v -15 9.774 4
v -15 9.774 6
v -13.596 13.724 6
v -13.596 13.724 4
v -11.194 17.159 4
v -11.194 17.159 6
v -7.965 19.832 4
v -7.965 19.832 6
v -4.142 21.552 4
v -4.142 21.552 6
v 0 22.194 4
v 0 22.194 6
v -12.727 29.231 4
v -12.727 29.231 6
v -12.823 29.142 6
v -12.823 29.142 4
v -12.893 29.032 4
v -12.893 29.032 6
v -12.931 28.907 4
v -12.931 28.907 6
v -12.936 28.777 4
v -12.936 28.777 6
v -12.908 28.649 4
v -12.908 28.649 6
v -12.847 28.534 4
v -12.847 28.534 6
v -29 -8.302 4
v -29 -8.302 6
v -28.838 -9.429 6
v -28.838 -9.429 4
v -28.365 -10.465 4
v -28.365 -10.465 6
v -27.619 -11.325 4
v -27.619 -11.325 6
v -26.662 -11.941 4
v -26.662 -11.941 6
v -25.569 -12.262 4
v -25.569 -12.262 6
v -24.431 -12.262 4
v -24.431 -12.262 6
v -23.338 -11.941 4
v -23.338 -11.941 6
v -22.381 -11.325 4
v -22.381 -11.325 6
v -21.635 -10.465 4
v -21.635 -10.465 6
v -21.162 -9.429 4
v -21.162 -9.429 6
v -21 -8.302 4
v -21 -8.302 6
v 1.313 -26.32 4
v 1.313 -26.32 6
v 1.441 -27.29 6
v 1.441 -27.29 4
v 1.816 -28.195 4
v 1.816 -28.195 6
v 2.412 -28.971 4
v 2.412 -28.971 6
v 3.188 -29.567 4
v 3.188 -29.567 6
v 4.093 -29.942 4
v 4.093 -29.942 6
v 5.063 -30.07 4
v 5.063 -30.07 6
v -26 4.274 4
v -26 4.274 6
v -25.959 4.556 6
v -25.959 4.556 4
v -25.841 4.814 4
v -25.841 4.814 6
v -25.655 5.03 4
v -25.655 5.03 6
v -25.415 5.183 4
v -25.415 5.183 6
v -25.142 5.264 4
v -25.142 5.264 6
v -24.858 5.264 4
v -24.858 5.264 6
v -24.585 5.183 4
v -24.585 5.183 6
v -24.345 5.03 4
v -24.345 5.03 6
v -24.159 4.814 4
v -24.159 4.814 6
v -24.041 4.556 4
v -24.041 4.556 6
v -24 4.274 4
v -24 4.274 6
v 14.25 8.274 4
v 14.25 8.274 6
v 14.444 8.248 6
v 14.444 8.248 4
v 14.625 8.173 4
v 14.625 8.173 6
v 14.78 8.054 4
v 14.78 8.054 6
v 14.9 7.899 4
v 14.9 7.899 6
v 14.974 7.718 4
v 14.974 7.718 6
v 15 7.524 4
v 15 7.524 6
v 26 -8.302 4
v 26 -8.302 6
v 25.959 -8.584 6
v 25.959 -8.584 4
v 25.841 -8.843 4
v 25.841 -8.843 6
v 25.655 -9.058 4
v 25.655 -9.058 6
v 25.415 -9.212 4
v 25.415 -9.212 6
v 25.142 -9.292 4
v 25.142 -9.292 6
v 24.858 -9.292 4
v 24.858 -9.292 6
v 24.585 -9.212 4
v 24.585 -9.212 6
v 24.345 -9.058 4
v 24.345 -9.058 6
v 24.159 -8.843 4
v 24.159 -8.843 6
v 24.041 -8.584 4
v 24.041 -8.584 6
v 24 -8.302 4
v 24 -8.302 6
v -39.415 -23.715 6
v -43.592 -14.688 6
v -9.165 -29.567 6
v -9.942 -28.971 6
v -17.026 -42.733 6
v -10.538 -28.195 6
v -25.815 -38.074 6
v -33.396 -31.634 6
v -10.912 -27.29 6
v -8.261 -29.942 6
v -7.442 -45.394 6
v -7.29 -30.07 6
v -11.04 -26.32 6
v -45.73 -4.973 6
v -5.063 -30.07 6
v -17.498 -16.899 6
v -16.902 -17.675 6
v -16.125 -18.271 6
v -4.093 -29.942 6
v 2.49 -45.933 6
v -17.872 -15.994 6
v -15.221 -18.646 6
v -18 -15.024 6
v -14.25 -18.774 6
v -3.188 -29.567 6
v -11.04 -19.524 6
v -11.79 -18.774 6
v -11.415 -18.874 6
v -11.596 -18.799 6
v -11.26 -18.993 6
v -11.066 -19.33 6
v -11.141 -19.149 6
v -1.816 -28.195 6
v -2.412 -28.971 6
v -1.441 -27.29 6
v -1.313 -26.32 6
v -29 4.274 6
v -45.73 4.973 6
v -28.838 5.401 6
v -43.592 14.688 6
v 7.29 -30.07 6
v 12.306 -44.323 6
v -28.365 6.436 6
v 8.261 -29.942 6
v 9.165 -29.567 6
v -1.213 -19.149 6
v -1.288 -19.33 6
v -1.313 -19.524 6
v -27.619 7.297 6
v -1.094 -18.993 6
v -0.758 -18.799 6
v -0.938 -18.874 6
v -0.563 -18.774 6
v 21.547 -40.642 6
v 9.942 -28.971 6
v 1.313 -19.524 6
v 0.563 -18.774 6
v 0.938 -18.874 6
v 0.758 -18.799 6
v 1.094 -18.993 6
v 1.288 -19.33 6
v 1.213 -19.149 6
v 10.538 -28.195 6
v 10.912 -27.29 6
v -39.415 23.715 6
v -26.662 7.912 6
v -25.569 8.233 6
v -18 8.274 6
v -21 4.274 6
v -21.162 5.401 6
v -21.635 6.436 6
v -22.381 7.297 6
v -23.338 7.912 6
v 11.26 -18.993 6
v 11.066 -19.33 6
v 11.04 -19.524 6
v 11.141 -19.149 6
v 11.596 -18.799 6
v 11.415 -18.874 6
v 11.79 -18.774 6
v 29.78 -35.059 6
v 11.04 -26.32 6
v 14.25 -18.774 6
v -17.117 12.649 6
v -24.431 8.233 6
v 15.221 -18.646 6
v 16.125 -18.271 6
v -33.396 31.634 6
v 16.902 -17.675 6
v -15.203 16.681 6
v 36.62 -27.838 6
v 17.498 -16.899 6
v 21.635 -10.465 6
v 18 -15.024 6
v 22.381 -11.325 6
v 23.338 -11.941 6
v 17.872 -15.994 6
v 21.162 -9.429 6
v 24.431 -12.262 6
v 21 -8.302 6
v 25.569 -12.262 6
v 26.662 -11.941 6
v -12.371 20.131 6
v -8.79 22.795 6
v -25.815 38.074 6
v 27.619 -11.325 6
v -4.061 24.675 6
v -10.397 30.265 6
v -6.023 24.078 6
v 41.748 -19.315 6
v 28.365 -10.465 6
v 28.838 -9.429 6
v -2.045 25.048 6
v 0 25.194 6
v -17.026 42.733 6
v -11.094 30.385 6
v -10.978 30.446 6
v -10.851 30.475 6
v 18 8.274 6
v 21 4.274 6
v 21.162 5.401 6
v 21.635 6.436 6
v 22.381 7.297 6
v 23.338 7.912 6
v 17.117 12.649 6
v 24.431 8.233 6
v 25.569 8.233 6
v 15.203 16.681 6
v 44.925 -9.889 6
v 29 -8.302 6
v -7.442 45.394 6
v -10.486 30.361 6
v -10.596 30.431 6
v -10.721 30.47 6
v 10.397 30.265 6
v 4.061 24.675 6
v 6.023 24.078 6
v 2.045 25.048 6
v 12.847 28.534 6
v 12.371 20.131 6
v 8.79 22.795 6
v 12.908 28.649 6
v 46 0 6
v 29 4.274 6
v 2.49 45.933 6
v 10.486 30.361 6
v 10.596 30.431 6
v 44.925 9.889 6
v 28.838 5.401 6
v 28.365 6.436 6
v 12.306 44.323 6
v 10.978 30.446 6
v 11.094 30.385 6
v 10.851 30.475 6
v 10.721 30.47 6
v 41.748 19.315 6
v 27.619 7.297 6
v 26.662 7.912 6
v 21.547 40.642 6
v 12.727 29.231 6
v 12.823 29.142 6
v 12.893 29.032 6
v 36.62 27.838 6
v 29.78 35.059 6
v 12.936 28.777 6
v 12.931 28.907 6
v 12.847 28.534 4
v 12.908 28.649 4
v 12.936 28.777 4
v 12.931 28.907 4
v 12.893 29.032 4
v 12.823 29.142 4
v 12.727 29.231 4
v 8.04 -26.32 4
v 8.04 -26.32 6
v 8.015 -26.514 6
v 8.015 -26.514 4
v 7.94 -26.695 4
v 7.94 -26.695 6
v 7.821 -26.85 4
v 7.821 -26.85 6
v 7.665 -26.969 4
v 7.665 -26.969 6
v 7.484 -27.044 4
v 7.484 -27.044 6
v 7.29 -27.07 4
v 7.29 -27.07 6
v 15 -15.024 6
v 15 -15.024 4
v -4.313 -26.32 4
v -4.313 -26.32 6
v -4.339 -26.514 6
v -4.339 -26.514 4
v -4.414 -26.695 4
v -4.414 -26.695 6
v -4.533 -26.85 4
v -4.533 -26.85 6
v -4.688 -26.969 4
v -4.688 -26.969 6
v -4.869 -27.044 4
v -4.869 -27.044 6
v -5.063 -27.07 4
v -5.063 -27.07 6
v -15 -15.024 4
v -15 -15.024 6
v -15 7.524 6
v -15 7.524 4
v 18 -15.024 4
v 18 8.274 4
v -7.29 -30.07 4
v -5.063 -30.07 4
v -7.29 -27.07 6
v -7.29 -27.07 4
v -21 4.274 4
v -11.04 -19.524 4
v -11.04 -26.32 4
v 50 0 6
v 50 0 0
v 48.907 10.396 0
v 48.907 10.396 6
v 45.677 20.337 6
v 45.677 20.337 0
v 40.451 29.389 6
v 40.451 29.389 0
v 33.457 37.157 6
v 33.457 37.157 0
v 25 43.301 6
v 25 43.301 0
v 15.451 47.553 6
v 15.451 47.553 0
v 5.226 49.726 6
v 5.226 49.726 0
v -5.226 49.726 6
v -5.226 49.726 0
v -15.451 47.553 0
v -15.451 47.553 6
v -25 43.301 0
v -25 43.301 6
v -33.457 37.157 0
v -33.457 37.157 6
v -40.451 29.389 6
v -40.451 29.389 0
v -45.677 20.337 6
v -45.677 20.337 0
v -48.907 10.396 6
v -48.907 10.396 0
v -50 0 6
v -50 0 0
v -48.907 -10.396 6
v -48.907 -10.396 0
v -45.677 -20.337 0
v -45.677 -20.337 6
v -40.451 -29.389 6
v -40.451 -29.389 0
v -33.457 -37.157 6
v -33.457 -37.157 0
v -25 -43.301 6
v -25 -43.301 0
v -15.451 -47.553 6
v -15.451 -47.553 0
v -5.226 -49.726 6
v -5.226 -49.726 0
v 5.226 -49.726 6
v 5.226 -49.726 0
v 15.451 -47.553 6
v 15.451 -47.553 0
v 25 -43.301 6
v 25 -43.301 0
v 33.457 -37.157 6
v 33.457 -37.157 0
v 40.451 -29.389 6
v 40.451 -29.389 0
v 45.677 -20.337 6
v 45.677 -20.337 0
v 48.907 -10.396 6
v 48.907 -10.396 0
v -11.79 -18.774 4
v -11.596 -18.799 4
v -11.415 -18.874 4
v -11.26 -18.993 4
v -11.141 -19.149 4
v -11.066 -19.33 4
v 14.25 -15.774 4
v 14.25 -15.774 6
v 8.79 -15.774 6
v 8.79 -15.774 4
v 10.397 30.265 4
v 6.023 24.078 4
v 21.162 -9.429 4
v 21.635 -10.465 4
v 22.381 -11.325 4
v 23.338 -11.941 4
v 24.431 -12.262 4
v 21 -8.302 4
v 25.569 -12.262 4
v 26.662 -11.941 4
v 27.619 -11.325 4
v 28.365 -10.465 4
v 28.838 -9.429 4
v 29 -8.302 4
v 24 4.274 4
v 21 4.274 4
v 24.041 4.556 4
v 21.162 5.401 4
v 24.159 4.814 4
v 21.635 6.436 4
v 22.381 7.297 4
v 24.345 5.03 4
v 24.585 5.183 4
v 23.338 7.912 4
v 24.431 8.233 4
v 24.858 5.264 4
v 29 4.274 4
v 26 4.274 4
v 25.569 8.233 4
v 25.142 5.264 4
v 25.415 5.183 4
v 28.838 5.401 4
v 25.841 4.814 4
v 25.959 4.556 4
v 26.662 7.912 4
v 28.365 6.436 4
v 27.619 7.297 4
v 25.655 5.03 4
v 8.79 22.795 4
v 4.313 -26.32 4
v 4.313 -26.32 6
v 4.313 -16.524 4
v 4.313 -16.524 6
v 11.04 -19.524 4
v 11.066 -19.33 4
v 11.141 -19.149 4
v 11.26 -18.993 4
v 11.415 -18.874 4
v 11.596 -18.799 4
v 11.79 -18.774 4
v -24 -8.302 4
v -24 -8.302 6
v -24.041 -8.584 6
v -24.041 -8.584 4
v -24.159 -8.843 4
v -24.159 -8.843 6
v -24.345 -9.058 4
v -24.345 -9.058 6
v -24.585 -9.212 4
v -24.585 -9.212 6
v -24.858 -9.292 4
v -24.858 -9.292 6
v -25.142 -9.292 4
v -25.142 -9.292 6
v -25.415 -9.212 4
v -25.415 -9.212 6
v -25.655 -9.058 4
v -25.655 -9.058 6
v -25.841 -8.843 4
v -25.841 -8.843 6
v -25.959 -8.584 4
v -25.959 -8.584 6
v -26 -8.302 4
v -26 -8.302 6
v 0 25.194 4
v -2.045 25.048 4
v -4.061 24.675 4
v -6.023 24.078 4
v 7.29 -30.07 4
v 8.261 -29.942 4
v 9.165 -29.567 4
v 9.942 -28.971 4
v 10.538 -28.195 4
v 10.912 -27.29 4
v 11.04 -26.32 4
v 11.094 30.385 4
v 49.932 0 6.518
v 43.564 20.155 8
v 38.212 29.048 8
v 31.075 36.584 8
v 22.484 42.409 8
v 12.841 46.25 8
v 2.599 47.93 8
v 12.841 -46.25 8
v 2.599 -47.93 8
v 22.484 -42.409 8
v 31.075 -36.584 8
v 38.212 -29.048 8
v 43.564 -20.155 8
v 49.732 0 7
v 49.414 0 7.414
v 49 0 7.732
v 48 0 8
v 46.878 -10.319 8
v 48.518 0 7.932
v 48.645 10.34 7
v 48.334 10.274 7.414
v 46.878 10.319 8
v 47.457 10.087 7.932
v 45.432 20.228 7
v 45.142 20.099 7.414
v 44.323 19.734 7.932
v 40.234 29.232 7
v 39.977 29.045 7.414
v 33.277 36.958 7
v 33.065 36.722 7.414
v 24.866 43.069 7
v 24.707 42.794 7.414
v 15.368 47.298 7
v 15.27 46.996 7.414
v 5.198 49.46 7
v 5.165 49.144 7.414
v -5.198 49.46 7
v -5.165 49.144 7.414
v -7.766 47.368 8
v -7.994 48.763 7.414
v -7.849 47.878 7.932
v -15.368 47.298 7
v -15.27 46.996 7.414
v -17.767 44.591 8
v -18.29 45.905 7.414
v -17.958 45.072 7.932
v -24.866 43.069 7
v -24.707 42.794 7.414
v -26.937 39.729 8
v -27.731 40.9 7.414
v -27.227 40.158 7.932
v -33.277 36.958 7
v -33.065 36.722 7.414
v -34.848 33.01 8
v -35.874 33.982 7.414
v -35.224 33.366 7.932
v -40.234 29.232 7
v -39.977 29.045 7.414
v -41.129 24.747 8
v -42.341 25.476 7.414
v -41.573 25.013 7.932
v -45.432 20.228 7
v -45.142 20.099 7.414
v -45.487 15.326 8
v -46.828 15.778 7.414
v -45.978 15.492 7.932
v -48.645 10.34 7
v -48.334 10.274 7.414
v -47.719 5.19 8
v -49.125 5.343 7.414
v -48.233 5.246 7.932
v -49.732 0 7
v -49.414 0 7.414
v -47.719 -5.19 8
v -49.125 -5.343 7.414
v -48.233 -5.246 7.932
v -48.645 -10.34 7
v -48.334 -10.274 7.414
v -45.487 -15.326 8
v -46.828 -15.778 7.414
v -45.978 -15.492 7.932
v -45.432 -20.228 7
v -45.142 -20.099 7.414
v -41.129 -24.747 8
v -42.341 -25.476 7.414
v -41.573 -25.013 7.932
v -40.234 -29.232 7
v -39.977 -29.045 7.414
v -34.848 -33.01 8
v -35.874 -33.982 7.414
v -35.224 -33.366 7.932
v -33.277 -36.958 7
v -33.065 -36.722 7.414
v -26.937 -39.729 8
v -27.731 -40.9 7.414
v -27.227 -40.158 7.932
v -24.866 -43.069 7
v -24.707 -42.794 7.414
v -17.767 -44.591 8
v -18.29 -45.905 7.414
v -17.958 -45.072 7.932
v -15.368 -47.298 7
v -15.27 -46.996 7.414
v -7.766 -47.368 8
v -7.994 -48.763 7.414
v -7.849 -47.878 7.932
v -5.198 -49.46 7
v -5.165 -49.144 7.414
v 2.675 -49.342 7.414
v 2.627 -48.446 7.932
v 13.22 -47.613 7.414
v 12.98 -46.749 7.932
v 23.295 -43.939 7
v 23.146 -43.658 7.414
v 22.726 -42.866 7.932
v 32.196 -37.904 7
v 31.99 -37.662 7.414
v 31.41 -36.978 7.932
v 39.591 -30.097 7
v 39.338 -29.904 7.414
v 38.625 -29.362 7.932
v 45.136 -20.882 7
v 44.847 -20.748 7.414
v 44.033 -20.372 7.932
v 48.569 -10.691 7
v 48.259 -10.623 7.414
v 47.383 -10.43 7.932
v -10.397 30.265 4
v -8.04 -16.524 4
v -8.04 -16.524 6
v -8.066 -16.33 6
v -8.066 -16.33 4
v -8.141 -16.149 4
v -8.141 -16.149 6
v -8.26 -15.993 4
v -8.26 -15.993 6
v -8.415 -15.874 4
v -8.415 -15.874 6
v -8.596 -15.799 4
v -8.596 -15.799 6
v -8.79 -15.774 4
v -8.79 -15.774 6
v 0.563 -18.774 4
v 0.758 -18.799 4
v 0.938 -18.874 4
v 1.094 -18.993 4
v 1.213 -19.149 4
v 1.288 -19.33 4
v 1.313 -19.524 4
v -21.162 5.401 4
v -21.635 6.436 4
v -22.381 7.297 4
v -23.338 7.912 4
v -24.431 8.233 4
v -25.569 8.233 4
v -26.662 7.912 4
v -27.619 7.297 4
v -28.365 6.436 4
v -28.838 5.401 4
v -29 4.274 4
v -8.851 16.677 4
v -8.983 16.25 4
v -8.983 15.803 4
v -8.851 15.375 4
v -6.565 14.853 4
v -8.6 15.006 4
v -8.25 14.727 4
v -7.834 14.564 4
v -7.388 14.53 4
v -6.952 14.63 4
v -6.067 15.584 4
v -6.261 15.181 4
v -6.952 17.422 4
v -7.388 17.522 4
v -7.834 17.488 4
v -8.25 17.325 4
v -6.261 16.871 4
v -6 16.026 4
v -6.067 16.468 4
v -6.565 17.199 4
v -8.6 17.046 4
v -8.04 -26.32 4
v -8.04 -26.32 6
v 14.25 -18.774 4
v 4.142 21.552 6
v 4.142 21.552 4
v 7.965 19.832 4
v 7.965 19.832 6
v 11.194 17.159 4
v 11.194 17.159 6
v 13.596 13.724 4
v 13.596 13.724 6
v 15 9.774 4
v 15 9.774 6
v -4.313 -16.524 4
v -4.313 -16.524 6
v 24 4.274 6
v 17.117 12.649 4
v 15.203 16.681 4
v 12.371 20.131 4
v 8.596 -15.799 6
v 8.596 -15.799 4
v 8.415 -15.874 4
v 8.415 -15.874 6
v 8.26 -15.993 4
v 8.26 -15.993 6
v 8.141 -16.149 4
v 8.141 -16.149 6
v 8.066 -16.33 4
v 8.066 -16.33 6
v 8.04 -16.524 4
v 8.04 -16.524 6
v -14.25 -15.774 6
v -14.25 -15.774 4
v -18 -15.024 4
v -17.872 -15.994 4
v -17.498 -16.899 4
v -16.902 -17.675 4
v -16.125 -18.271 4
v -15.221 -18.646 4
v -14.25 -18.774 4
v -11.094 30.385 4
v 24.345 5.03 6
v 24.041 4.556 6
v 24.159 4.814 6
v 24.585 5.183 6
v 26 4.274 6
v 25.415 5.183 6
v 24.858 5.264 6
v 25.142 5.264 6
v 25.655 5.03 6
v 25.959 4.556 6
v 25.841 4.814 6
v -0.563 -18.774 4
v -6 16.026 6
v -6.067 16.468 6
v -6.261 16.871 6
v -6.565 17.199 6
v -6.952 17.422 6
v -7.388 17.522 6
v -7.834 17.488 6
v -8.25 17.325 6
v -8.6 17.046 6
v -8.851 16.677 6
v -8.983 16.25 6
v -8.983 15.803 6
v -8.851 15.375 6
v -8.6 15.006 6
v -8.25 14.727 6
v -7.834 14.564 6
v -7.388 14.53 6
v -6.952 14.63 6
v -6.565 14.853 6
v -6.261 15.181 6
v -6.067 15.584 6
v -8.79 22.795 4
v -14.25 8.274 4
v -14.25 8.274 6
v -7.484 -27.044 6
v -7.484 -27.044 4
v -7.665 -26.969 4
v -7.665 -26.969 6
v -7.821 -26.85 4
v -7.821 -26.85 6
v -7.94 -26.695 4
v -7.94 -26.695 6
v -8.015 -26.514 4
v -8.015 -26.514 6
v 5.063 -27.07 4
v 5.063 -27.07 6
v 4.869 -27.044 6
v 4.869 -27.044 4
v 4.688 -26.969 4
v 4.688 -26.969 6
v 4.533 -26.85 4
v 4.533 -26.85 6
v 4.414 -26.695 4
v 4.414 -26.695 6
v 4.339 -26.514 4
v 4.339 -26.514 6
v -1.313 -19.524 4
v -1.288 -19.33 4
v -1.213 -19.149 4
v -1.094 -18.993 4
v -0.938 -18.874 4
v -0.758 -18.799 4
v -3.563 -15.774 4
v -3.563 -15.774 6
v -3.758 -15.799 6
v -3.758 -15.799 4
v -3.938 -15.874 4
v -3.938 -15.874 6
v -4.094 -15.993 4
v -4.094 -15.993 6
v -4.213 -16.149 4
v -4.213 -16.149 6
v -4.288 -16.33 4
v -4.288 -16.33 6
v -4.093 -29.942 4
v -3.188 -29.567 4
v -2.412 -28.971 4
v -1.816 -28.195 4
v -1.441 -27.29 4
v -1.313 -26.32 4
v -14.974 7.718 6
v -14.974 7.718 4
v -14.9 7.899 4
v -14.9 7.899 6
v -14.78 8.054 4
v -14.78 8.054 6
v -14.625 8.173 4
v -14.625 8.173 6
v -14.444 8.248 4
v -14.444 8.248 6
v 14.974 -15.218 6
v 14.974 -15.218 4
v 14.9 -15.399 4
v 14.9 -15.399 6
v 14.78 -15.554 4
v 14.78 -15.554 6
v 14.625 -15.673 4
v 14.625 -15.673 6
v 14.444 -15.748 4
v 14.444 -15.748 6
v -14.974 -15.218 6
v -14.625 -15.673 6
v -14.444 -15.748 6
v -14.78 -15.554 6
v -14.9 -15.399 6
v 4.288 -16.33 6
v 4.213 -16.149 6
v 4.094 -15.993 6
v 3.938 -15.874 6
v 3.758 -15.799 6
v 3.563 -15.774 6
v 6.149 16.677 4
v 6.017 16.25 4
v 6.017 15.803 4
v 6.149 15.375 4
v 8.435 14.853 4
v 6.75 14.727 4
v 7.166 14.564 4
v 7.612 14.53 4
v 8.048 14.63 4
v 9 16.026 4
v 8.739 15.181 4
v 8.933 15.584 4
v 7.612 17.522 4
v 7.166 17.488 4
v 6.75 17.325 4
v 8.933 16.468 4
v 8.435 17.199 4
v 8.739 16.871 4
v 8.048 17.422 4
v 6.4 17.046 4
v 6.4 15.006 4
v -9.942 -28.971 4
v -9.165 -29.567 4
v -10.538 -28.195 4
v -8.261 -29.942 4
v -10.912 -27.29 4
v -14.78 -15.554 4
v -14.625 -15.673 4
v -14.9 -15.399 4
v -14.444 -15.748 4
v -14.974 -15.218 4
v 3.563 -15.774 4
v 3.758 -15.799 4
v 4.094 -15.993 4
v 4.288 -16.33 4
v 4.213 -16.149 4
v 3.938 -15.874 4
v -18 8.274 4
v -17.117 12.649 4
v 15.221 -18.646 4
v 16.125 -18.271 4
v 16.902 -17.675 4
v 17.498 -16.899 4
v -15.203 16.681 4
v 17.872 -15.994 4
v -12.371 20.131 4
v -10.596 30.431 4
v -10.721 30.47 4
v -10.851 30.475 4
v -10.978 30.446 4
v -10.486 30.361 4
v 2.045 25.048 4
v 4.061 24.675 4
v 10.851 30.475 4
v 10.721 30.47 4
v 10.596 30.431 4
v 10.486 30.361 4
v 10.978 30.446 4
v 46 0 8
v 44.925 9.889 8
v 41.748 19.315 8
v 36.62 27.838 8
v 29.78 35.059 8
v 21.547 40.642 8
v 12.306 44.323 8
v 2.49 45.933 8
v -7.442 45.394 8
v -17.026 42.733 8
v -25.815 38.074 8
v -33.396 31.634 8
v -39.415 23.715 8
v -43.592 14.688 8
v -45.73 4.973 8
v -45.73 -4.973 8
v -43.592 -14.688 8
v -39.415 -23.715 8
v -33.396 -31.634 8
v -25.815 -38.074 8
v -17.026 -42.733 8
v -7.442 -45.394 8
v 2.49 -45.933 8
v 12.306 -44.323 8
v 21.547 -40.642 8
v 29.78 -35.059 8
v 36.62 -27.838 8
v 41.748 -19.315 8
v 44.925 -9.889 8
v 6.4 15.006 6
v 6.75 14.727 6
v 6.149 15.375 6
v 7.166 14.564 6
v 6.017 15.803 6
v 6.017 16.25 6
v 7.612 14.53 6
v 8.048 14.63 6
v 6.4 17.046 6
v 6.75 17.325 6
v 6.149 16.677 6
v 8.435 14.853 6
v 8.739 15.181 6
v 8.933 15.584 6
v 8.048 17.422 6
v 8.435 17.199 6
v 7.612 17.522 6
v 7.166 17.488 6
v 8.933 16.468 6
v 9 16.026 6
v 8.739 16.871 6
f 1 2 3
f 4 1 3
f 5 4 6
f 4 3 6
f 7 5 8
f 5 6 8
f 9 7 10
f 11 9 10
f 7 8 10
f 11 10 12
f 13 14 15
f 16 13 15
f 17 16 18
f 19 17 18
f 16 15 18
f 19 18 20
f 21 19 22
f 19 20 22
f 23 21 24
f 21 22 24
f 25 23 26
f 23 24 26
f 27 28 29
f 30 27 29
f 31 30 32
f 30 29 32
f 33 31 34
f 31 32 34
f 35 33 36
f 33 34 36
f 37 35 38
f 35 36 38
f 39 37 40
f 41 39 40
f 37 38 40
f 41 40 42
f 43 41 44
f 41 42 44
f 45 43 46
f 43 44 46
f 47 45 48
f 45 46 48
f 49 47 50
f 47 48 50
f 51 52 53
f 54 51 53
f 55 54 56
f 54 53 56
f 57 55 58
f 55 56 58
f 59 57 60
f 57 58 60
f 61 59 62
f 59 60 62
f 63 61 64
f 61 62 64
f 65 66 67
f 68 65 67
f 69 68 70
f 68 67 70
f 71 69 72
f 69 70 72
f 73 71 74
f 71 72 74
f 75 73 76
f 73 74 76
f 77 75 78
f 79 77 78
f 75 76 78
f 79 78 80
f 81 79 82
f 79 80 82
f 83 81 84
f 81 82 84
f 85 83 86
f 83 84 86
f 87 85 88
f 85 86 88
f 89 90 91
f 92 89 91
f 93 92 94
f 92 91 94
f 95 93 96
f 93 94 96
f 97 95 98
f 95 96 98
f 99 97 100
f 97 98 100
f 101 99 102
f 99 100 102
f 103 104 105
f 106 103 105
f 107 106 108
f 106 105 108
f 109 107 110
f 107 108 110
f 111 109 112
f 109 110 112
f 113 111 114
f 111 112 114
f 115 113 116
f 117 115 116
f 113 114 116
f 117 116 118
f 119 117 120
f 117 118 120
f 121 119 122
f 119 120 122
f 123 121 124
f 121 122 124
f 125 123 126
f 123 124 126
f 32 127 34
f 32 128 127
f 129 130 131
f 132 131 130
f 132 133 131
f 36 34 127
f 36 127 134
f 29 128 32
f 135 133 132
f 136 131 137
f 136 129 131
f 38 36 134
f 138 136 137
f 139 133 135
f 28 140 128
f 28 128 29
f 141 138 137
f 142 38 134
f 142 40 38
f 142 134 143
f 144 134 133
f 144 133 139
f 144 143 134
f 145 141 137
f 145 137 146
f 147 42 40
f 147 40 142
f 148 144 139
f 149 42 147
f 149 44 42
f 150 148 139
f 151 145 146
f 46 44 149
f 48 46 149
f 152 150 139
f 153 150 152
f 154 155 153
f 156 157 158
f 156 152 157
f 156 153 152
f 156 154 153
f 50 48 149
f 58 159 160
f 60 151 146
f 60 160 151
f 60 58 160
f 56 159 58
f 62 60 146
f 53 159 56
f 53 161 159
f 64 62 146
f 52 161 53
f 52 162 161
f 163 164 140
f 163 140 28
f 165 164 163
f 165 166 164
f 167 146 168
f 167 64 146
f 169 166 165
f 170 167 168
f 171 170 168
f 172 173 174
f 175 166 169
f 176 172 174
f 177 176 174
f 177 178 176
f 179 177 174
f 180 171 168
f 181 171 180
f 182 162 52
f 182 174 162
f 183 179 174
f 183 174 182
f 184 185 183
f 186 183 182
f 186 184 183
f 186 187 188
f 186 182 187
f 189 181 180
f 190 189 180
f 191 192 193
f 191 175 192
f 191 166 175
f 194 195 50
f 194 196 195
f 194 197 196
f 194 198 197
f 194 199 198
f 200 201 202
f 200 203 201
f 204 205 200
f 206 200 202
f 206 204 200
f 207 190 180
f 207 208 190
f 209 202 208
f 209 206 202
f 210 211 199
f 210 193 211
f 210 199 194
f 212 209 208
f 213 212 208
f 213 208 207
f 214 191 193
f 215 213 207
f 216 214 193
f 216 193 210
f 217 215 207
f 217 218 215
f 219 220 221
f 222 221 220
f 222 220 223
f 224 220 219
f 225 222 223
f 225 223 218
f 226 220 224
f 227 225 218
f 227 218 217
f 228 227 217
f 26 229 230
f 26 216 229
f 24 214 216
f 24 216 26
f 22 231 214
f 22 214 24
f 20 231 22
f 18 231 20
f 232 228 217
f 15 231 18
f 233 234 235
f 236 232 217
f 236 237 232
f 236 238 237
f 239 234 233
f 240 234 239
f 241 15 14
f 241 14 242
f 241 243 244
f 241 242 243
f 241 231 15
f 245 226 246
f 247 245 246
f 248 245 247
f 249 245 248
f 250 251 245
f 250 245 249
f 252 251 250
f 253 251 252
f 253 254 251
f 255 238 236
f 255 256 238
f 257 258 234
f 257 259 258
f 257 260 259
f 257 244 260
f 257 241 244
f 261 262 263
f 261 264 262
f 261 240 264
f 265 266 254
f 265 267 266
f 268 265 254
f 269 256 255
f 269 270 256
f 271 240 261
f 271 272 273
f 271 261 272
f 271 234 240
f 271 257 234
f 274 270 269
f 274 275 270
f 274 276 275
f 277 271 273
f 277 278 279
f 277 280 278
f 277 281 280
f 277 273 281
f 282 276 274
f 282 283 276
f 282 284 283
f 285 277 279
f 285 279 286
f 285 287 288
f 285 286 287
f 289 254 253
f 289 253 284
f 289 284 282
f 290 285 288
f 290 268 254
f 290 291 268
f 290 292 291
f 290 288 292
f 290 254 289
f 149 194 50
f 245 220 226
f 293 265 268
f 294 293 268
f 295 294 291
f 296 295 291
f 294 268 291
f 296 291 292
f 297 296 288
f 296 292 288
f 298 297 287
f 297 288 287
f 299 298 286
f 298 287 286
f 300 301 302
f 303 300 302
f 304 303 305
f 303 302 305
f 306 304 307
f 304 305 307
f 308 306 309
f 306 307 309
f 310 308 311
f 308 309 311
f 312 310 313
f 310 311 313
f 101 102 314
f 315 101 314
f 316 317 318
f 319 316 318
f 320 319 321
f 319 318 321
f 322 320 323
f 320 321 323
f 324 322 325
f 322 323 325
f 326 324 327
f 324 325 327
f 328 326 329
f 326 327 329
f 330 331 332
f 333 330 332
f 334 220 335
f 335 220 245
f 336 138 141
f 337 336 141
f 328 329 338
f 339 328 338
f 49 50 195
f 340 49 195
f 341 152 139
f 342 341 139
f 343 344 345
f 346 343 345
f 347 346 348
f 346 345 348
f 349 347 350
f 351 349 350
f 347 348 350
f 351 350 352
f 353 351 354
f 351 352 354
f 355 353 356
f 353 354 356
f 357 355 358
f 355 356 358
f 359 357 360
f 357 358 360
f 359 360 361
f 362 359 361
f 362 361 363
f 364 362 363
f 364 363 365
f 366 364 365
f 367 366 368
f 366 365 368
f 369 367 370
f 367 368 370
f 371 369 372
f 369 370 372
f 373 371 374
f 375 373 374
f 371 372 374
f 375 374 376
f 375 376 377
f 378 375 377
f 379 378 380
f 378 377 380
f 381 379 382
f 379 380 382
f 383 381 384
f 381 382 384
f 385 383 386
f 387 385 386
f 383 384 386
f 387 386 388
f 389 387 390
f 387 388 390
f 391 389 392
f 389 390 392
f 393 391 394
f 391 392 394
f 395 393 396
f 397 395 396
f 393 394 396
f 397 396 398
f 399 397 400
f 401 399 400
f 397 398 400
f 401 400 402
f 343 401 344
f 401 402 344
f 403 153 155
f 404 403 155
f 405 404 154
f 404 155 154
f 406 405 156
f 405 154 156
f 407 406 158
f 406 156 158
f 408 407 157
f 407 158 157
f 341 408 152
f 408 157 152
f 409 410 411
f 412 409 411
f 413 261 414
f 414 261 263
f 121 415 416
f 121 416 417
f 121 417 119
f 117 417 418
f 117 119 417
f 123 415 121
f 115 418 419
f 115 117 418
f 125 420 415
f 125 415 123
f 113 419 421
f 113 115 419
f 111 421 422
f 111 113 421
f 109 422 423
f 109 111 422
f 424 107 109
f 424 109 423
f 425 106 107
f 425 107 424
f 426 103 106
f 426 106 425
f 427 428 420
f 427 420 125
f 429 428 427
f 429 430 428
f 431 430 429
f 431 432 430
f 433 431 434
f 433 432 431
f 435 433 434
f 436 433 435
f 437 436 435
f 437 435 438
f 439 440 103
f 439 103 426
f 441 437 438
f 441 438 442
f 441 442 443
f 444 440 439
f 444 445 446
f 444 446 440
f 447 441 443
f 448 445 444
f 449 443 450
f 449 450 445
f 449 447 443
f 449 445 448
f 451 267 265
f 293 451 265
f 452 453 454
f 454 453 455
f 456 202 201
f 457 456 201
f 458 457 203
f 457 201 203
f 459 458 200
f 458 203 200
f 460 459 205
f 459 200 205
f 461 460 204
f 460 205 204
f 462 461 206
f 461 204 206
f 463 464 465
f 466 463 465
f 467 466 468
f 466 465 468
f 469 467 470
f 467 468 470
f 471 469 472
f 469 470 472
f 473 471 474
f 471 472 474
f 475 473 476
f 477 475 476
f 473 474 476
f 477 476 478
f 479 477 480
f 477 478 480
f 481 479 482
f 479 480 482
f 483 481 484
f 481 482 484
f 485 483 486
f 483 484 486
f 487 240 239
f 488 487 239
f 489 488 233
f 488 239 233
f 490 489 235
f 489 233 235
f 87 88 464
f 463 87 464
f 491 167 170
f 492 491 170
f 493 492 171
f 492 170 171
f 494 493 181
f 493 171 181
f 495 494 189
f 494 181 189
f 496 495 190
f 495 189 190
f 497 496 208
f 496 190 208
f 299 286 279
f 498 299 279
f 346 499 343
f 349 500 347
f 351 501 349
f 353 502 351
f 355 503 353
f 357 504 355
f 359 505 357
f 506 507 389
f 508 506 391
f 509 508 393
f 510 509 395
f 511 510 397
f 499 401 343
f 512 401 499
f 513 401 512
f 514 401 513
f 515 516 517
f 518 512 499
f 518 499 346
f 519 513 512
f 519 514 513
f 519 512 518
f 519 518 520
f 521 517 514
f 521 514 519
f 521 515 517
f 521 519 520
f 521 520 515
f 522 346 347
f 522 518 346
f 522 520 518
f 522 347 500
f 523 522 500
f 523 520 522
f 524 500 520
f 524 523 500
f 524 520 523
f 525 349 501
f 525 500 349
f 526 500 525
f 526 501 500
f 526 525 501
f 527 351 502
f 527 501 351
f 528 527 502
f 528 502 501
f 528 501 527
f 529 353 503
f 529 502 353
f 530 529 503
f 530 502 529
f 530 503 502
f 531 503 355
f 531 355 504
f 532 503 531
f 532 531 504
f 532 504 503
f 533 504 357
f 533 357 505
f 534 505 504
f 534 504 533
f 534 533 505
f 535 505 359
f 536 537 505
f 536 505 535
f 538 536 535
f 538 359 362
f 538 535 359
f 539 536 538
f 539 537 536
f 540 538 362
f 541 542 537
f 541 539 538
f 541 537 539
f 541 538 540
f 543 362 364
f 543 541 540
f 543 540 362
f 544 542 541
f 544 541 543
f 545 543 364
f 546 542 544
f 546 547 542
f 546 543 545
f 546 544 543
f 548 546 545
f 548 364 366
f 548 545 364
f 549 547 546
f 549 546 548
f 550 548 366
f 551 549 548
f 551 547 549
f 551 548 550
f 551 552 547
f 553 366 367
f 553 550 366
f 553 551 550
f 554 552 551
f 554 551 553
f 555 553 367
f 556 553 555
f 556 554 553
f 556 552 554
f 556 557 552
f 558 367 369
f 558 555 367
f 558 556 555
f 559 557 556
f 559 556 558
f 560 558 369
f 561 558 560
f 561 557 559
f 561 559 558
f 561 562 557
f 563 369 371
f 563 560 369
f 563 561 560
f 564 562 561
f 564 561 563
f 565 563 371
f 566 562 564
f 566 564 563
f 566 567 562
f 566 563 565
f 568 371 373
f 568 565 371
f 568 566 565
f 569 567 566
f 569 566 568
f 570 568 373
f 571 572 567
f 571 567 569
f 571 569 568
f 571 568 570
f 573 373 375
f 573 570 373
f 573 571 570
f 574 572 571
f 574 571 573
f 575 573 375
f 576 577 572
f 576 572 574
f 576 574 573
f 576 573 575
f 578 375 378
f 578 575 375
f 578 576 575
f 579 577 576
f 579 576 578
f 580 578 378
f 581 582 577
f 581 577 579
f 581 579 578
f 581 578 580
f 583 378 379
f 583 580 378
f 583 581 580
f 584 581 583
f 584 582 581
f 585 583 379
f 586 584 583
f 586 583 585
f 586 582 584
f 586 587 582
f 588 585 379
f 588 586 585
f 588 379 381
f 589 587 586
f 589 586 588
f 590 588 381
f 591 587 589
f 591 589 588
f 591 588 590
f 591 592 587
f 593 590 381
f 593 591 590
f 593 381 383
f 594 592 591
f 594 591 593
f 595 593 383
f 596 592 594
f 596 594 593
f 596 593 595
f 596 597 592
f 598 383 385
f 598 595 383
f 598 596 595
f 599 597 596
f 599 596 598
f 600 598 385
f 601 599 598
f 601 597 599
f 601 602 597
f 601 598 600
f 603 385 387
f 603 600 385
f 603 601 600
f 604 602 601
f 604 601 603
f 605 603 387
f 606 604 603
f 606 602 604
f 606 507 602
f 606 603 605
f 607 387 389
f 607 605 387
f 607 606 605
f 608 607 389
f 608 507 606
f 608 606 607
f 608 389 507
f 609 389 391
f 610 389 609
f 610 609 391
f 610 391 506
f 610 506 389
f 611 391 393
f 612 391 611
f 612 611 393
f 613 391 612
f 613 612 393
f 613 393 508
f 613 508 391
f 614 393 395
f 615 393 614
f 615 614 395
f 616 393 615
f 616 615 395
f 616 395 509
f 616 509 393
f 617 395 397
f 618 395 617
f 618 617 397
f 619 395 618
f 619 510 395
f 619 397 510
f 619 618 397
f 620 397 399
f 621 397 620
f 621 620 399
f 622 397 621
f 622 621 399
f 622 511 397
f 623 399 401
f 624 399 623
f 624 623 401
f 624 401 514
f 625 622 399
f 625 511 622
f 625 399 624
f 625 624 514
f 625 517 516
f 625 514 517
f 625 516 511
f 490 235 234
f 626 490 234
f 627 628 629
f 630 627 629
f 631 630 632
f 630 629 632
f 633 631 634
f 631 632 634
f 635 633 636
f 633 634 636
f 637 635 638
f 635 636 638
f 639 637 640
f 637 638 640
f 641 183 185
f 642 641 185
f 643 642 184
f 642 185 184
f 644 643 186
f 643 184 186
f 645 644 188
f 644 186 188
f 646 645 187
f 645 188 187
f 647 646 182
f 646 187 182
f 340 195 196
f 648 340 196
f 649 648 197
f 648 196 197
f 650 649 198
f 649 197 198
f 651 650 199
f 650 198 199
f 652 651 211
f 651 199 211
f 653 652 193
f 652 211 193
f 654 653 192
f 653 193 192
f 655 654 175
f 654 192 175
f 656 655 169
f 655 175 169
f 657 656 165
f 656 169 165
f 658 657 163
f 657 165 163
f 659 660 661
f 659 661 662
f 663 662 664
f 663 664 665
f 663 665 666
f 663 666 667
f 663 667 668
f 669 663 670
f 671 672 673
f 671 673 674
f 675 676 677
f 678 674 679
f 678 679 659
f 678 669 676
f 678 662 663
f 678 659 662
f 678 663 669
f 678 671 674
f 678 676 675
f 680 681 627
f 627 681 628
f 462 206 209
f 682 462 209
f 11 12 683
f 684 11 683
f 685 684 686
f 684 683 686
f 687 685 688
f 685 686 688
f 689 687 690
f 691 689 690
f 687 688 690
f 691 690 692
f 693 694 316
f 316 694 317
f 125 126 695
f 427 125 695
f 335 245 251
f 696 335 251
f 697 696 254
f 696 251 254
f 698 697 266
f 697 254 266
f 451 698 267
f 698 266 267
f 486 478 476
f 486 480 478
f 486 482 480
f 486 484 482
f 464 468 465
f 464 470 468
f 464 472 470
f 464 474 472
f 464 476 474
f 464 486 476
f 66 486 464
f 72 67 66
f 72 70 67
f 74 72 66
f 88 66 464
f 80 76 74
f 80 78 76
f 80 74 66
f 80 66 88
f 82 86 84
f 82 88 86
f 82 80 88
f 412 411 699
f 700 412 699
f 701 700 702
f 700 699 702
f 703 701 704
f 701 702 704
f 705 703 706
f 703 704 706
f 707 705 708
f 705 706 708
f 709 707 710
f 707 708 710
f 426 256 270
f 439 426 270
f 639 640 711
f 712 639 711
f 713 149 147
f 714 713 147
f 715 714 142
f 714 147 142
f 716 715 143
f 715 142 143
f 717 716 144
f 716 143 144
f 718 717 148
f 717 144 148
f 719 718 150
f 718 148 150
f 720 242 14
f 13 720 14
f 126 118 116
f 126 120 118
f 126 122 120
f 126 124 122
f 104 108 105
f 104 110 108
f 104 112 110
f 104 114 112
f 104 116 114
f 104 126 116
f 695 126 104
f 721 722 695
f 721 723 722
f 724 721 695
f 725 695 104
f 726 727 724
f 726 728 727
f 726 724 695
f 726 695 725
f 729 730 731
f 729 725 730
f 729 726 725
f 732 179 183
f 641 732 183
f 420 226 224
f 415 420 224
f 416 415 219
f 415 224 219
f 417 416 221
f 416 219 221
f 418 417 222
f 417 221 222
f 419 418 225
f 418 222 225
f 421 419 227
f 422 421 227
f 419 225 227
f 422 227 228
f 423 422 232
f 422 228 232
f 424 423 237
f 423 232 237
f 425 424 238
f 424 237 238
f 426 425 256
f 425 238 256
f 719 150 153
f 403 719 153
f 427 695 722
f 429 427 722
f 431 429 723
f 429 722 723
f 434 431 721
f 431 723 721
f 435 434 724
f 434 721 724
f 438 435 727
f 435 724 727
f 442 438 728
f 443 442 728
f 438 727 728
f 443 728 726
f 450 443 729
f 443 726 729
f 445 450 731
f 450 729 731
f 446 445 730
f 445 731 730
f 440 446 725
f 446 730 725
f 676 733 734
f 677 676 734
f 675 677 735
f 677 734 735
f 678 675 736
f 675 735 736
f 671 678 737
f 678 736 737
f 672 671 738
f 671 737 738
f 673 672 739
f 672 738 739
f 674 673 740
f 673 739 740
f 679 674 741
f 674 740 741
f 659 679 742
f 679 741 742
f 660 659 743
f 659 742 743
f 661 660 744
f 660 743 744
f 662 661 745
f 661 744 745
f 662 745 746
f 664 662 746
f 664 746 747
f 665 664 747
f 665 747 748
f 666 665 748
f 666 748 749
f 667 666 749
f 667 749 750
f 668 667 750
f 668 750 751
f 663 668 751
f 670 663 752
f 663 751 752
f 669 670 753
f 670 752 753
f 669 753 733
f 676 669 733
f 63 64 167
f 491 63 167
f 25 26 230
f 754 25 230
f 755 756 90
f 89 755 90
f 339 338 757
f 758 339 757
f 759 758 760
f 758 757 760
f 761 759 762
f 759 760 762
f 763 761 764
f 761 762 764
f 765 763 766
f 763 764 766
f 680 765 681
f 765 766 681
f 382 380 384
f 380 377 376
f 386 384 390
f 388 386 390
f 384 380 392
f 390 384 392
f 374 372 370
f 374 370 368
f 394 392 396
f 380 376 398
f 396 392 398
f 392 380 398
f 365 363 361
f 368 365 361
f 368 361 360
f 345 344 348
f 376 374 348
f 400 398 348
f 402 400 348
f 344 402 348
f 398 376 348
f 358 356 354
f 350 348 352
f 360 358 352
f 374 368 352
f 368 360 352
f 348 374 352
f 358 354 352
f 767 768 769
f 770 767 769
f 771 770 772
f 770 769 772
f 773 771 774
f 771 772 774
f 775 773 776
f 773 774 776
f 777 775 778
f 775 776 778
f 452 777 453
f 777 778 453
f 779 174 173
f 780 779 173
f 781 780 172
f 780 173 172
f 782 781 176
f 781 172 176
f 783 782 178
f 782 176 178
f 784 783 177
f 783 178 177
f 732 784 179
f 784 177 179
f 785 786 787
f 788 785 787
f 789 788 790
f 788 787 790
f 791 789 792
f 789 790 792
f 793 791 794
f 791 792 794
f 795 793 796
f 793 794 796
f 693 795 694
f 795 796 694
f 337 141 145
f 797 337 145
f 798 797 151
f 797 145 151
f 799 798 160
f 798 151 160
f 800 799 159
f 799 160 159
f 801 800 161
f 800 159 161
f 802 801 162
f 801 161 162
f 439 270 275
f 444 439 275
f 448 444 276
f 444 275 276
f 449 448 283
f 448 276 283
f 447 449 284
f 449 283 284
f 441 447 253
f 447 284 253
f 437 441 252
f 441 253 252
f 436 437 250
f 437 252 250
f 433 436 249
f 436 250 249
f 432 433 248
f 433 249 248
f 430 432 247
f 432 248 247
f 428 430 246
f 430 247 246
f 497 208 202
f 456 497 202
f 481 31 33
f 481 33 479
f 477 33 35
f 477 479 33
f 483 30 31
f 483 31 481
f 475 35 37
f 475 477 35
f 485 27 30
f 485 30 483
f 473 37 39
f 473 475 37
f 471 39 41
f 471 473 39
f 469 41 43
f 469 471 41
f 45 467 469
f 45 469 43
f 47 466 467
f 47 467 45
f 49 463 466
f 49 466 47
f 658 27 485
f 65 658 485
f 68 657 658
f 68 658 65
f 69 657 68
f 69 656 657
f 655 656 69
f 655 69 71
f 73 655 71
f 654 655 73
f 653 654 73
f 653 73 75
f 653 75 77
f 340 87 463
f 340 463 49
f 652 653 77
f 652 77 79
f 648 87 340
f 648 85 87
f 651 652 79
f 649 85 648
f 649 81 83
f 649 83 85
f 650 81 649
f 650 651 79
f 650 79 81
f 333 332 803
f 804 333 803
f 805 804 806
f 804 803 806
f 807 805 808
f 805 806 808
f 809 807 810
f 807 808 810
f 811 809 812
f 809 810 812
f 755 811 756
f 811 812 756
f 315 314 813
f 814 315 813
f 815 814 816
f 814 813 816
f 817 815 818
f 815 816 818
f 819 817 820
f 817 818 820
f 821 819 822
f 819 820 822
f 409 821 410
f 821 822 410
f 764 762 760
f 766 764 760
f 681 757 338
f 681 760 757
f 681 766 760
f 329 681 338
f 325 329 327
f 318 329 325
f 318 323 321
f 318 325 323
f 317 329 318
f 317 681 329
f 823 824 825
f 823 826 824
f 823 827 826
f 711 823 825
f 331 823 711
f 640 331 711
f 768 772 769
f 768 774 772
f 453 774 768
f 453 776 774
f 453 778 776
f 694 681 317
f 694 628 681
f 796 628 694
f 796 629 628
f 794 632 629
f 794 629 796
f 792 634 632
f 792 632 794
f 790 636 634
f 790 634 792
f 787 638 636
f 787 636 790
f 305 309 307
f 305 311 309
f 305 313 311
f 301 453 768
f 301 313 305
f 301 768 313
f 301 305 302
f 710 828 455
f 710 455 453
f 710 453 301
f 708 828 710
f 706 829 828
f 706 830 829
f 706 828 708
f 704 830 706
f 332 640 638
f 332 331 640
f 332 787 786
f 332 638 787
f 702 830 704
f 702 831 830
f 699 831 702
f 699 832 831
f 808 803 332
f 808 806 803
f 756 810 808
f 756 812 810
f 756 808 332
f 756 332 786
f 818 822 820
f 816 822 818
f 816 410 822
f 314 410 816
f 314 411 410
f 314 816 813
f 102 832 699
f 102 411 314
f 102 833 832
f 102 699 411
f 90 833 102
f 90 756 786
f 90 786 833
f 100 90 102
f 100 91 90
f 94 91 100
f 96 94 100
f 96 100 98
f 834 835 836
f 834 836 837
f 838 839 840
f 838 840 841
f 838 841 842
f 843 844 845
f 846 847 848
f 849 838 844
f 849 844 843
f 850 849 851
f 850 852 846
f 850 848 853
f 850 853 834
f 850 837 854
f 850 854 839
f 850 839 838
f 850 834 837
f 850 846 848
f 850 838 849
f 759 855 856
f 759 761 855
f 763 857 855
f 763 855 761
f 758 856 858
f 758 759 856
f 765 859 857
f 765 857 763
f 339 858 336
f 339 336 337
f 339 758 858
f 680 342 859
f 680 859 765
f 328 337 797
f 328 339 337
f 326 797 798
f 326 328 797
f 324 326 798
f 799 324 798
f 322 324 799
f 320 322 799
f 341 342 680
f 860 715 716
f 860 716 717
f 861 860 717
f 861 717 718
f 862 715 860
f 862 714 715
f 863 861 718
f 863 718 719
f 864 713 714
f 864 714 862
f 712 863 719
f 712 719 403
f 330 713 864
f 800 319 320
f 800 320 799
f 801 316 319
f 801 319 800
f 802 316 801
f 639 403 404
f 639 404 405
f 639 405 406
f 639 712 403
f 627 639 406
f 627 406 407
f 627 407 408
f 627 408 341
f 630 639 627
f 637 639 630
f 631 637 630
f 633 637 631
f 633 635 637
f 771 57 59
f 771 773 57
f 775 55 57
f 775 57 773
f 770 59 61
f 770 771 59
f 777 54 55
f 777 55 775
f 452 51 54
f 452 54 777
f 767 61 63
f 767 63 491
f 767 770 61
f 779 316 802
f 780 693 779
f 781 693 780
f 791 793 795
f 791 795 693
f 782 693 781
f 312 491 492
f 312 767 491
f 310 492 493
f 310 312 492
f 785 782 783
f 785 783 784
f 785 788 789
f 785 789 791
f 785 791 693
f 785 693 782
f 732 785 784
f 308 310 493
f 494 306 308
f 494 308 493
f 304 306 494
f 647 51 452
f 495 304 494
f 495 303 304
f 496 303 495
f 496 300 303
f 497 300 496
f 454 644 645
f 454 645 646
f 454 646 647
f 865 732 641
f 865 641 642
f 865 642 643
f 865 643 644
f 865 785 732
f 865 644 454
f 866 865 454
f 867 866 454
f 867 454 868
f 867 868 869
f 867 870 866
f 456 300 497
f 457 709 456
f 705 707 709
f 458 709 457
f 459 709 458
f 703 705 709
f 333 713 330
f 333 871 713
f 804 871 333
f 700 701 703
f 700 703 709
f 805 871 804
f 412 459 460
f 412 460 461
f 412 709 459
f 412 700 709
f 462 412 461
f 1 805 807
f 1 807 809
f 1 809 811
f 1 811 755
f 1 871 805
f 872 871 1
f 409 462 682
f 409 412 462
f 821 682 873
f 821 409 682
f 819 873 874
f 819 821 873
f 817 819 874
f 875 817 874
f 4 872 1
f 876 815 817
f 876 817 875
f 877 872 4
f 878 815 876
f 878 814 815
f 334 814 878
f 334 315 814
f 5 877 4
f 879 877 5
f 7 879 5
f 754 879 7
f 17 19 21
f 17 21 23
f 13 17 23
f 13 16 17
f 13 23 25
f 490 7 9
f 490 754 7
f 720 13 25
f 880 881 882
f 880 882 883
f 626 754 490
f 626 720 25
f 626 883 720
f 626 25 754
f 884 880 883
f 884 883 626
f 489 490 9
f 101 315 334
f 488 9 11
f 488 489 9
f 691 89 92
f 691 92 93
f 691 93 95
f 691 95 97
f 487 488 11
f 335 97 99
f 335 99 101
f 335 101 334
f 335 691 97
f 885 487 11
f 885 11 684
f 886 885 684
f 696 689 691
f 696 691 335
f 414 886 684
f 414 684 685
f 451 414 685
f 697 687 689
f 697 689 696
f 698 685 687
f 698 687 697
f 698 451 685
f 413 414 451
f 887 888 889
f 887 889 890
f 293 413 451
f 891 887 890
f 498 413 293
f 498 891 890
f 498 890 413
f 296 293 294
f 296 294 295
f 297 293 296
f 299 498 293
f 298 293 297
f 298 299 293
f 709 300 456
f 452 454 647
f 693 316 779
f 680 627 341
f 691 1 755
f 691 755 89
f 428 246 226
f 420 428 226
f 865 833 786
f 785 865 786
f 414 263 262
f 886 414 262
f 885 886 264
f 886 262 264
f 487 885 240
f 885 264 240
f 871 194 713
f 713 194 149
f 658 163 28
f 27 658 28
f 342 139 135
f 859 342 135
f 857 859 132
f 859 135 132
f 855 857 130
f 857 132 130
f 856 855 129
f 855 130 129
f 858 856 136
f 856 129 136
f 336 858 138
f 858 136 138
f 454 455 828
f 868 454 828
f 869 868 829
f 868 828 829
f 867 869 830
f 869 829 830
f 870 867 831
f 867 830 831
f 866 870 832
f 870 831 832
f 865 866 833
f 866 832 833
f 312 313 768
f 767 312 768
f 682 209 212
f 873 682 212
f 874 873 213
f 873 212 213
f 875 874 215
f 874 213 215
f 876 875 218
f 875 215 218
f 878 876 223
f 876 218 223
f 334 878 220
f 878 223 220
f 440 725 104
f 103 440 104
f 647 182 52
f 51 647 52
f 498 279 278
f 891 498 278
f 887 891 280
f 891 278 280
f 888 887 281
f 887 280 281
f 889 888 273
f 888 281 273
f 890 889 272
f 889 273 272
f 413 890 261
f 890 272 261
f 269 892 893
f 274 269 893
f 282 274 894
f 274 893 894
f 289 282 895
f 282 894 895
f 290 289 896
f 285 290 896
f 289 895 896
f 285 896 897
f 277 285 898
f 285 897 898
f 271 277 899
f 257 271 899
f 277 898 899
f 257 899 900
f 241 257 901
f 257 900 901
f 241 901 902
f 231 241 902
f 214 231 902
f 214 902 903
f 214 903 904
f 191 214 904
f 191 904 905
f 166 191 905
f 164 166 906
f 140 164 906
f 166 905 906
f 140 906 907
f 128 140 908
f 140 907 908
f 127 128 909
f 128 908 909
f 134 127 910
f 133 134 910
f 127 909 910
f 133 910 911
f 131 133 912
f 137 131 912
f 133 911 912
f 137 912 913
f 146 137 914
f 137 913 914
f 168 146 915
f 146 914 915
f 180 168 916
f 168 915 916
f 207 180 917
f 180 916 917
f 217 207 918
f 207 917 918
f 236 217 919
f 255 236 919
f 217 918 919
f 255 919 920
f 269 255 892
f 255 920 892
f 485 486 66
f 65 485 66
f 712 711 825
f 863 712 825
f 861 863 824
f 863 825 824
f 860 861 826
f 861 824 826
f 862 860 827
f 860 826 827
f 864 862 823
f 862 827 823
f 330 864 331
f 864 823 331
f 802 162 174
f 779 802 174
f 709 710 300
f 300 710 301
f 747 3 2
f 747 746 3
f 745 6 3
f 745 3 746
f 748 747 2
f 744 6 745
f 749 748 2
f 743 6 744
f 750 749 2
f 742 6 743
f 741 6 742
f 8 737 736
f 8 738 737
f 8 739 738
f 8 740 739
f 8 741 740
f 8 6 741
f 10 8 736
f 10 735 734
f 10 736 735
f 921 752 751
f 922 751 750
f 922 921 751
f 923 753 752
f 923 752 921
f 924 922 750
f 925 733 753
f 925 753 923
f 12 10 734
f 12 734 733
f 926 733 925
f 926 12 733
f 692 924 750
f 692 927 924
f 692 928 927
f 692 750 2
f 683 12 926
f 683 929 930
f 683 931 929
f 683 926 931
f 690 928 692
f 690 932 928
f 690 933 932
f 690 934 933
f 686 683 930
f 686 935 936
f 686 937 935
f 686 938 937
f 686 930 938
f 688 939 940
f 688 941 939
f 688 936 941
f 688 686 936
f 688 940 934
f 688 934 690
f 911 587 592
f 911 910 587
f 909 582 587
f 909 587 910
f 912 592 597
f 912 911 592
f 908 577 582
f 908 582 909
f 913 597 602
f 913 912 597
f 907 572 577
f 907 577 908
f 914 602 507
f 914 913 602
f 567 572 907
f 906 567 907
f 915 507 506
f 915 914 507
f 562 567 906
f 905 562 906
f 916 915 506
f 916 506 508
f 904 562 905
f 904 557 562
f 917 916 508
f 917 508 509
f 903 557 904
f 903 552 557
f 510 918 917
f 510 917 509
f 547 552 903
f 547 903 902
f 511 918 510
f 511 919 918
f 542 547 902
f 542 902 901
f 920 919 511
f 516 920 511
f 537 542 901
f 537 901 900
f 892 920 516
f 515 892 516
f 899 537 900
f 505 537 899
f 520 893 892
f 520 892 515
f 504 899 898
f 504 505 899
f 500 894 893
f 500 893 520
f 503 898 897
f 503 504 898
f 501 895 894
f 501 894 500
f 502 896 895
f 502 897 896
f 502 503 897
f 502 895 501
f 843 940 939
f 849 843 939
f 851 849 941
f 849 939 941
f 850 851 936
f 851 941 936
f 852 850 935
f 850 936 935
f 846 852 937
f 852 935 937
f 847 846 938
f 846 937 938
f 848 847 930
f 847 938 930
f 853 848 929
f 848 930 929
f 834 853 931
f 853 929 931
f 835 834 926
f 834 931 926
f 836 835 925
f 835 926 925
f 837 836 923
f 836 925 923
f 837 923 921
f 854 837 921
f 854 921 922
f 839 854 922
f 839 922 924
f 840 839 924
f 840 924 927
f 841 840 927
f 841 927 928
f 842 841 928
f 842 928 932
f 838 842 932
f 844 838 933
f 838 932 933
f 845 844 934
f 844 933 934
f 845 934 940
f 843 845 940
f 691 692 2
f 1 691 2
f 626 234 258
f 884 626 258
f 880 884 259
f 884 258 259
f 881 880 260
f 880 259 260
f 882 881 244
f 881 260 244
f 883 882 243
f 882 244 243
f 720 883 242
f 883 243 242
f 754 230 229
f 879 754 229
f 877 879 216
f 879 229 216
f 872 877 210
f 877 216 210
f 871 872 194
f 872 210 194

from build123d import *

# Parameters (mm, degrees)
F0_R      = 50
F2_DEPTH  = 8
F4_R      = 2
F6_R      = 46
F7_DEPTH  = 2
F9_DEPTH  = 2
F8_R      = 1.5
F10_DEPTH = 2


with BuildPart() as f2:
    # F0 (on Top) → F2 (new body)
    with BuildSketch(Plane.XY):
        Circle(F0_R)
    extrude(amount=F2_DEPTH)

    # F4
    f4_edges = [f2.edges().sort_by_distance(p)[0] for p in [
        (-50, 0, 8),
    ]]
    fillet(f4_edges, radius=F4_R)

    # F6 (on face) → F7 (cut)
    with BuildSketch(Plane.XY.offset(8)):
        Circle(F6_R)
    extrude(amount=-F7_DEPTH, mode=Mode.SUBTRACT)

    # F8 (on face) → F9 (cut)
    with BuildSketch(Plane.XY.offset(6)):
        with BuildLine():
            ThreePointArc((-1.3134240992, -19.5237704918), (-1.0937541851, -18.9934404059), (-0.5634240992, -18.7737704918))
            Line((-0.5634240992, -18.7737704918), (0, -18.7737704918))
            Line((0, -18.7737704918), (0.5634240992, -18.7737704918))
            ThreePointArc((0.5634240992, -18.7737704918), (1.0937541851, -18.9934404059), (1.3134240992, -19.5237704918))
            Line((1.3134240992, -19.5237704918), (1.3134240992, -26.3196417335))
            ThreePointArc((1.3134240992, -26.3196417335), (2.4117736698, -28.9712921629), (5.0634240992, -30.0696417335))
            Line((5.0634240992, -30.0696417335), (7.2902552709, -30.0696417335))
            ThreePointArc((7.2902552709, -30.0696417335), (9.9419057003, -28.9712921629), (11.0402552709, -26.3196417335))
            Line((11.0402552709, -26.3196417335), (11.0402552709, -19.5237704918))
            ThreePointArc((11.0402552709, -19.5237704918), (11.259925185, -18.9934404059), (11.7902552709, -18.7737704918))
            Line((11.7902552709, -18.7737704918), (14.25, -18.7737704918))
            ThreePointArc((14.25, -18.7737704918), (16.9016504294, -17.6754209213), (18, -15.0237704918))
            Line((18, -15.0237704918), (18, 8.2737704918))
            ThreePointArc((18, 8.2737704918), (15.2027368941, 16.6809104679), (8.7900681537, 22.7950222666))
            Line((8.7900681537, 22.7950222666), (12.8468124166, 28.5337620023))
            ThreePointArc((12.8468124166, 28.5337620023), (12.9313132133, 28.9069994934), (12.7271455387, 29.2306693407))
            Line((12.7271455387, 29.2306693407), (11.0939971059, 30.3851502616))
            ThreePointArc((11.0939971059, 30.3851502616), (10.7207596148, 30.4696510582), (10.3970897675, 30.2654833836))
            Line((10.3970897675, 30.2654833836), (6.0233529733, 24.078320598))
            ThreePointArc((6.0233529733, 24.078320598), (3.0586137327, 24.8896799806), (0, 25.1944173204))
            ThreePointArc((0, 25.1944173204), (-3.0586137327, 24.8896799806), (-6.0233529733, 24.078320598))
            Line((-6.0233529733, 24.078320598), (-10.3970897675, 30.2654833836))
            ThreePointArc((-10.3970897675, 30.2654833836), (-10.7207596148, 30.4696510582), (-11.0939971059, 30.3851502616))
            Line((-11.0939971059, 30.3851502616), (-12.7271455387, 29.2306693407))
            ThreePointArc((-12.7271455387, 29.2306693407), (-12.9313132133, 28.9069994934), (-12.8468124166, 28.5337620023))
            Line((-12.8468124166, 28.5337620023), (-8.7900681537, 22.7950222666))
            ThreePointArc((-8.7900681537, 22.7950222666), (-15.2027368941, 16.6809104679), (-18, 8.2737704918))
            Line((-18, 8.2737704918), (-18, -15.0237704918))
            ThreePointArc((-18, -15.0237704918), (-16.9016504294, -17.6754209213), (-14.25, -18.7737704918))
            Line((-14.25, -18.7737704918), (-11.7902552709, -18.7737704918))
            ThreePointArc((-11.7902552709, -18.7737704918), (-11.259925185, -18.9934404059), (-11.0402552709, -19.5237704918))
            Line((-11.0402552709, -19.5237704918), (-11.0402552709, -26.3196417335))
            ThreePointArc((-11.0402552709, -26.3196417335), (-9.9419057003, -28.9712921629), (-7.2902552709, -30.0696417335))
            Line((-7.2902552709, -30.0696417335), (-5.0634240992, -30.0696417335))
            ThreePointArc((-5.0634240992, -30.0696417335), (-2.4117736698, -28.9712921629), (-1.3134240992, -26.3196417335))
            Line((-1.3134240992, -26.3196417335), (-1.3134240992, -19.5237704918))
        make_face()
        with BuildLine():
            Line((-14.25, 8.2737704918), (0, 8.2737704918))
            Line((0, 8.2737704918), (14.25, 8.2737704918))
            ThreePointArc((14.25, 8.2737704918), (14.7803300859, 8.0541005777), (15, 7.5237704918))
            Line((15, 7.5237704918), (15, -15.0237704918))
            ThreePointArc((15, -15.0237704918), (14.7803300859, -15.5541005777), (14.25, -15.7737704918))
            Line((14.25, -15.7737704918), (8.7902552709, -15.7737704918))
            ThreePointArc((8.7902552709, -15.7737704918), (8.259925185, -15.9934404059), (8.0402552709, -16.5237704918))
            Line((8.0402552709, -16.5237704918), (8.0402552709, -26.3196417335))
            ThreePointArc((8.0402552709, -26.3196417335), (7.8205853568, -26.8499718194), (7.2902552709, -27.0696417335))
            Line((7.2902552709, -27.0696417335), (5.0634240992, -27.0696417335))
            ThreePointArc((5.0634240992, -27.0696417335), (4.5330940133, -26.8499718194), (4.3134240992, -26.3196417335))
            Line((4.3134240992, -26.3196417335), (4.3134240992, -16.5237704918))
            ThreePointArc((4.3134240992, -16.5237704918), (4.0937541851, -15.9934404059), (3.5634240992, -15.7737704918))
            Line((3.5634240992, -15.7737704918), (0, -15.7737704918))
            Line((0, -15.7737704918), (-3.5634240992, -15.7737704918))
            ThreePointArc((-3.5634240992, -15.7737704918), (-4.0937541851, -15.9934404059), (-4.3134240992, -16.5237704918))
            Line((-4.3134240992, -16.5237704918), (-4.3134240992, -26.3196417335))
            ThreePointArc((-4.3134240992, -26.3196417335), (-4.5330940133, -26.8499718194), (-5.0634240992, -27.0696417335))
            Line((-5.0634240992, -27.0696417335), (-7.2902552709, -27.0696417335))
            ThreePointArc((-7.2902552709, -27.0696417335), (-7.8205853568, -26.8499718194), (-8.0402552709, -26.3196417335))
            Line((-8.0402552709, -26.3196417335), (-8.0402552709, -16.5237704918))
            ThreePointArc((-8.0402552709, -16.5237704918), (-8.259925185, -15.9934404059), (-8.7902552709, -15.7737704918))
            Line((-8.7902552709, -15.7737704918), (-14.25, -15.7737704918))
            ThreePointArc((-14.25, -15.7737704918), (-14.7803300859, -15.5541005777), (-15, -15.0237704918))
            Line((-15, -15.0237704918), (-15, 7.5237704918))
            ThreePointArc((-15, 7.5237704918), (-14.7803300859, 8.0541005777), (-14.25, 8.2737704918))
        make_face(mode=Mode.SUBTRACT)
        with BuildLine():
            Line((15, 9.7737704918), (0, 9.7737704918))
            Line((0, 9.7737704918), (-15, 9.7737704918))
            ThreePointArc((-15, 9.7737704918), (-9.6695107404, 18.6041395087), (0, 22.1944173204))
            ThreePointArc((0, 22.1944173204), (9.6695107404, 18.6041395087), (15, 9.7737704918))
        make_face(mode=Mode.SUBTRACT)
        with BuildLine():
            Line((-21, -8.3022542986), (-21, 4.2737704918))
            ThreePointArc((-21, 4.2737704918), (-25, 8.2737704918), (-29, 4.2737704918))
            Line((-29, 4.2737704918), (-29, -8.3022542986))
            ThreePointArc((-29, -8.3022542986), (-25, -12.3022542986), (-21, -8.3022542986))
        make_face()
        with BuildLine():
            Line((-26, -8.3022542986), (-26, 4.2737704918))
            ThreePointArc((-26, 4.2737704918), (-25, 5.2737704918), (-24, 4.2737704918))
            Line((-24, 4.2737704918), (-24, -8.3022542986))
            ThreePointArc((-24, -8.3022542986), (-25, -9.3022542986), (-26, -8.3022542986))
        make_face(mode=Mode.SUBTRACT)
        with BuildLine():
            ThreePointArc((21, -8.3022542986), (25, -12.3022542986), (29, -8.3022542986))
            Line((29, -8.3022542986), (29, 4.2737704918))
            ThreePointArc((29, 4.2737704918), (25, 8.2737704918), (21, 4.2737704918))
            Line((21, 4.2737704918), (21, -8.3022542986))
        make_face()
        with BuildLine():
            Line((26, 4.2737704918), (26, -8.3022542986))
            ThreePointArc((26, -8.3022542986), (25, -9.3022542986), (24, -8.3022542986))
            Line((24, -8.3022542986), (24, 4.2737704918))
            ThreePointArc((24, 4.2737704918), (25, 5.2737704918), (26, 4.2737704918))
        make_face(mode=Mode.SUBTRACT)
    extrude(amount=-F9_DEPTH, mode=Mode.SUBTRACT)

    # F8 (on face) → F10 (cut)
    with BuildSketch(Plane.XY.offset(6)):
        with Locations((-7.5, 16.0260769339)):
            Circle(F8_R)
        with Locations((7.5, 16.0260769339)):
            Circle(F8_R)
    extrude(amount=-F10_DEPTH, mode=Mode.SUBTRACT)


solid = f2.part
